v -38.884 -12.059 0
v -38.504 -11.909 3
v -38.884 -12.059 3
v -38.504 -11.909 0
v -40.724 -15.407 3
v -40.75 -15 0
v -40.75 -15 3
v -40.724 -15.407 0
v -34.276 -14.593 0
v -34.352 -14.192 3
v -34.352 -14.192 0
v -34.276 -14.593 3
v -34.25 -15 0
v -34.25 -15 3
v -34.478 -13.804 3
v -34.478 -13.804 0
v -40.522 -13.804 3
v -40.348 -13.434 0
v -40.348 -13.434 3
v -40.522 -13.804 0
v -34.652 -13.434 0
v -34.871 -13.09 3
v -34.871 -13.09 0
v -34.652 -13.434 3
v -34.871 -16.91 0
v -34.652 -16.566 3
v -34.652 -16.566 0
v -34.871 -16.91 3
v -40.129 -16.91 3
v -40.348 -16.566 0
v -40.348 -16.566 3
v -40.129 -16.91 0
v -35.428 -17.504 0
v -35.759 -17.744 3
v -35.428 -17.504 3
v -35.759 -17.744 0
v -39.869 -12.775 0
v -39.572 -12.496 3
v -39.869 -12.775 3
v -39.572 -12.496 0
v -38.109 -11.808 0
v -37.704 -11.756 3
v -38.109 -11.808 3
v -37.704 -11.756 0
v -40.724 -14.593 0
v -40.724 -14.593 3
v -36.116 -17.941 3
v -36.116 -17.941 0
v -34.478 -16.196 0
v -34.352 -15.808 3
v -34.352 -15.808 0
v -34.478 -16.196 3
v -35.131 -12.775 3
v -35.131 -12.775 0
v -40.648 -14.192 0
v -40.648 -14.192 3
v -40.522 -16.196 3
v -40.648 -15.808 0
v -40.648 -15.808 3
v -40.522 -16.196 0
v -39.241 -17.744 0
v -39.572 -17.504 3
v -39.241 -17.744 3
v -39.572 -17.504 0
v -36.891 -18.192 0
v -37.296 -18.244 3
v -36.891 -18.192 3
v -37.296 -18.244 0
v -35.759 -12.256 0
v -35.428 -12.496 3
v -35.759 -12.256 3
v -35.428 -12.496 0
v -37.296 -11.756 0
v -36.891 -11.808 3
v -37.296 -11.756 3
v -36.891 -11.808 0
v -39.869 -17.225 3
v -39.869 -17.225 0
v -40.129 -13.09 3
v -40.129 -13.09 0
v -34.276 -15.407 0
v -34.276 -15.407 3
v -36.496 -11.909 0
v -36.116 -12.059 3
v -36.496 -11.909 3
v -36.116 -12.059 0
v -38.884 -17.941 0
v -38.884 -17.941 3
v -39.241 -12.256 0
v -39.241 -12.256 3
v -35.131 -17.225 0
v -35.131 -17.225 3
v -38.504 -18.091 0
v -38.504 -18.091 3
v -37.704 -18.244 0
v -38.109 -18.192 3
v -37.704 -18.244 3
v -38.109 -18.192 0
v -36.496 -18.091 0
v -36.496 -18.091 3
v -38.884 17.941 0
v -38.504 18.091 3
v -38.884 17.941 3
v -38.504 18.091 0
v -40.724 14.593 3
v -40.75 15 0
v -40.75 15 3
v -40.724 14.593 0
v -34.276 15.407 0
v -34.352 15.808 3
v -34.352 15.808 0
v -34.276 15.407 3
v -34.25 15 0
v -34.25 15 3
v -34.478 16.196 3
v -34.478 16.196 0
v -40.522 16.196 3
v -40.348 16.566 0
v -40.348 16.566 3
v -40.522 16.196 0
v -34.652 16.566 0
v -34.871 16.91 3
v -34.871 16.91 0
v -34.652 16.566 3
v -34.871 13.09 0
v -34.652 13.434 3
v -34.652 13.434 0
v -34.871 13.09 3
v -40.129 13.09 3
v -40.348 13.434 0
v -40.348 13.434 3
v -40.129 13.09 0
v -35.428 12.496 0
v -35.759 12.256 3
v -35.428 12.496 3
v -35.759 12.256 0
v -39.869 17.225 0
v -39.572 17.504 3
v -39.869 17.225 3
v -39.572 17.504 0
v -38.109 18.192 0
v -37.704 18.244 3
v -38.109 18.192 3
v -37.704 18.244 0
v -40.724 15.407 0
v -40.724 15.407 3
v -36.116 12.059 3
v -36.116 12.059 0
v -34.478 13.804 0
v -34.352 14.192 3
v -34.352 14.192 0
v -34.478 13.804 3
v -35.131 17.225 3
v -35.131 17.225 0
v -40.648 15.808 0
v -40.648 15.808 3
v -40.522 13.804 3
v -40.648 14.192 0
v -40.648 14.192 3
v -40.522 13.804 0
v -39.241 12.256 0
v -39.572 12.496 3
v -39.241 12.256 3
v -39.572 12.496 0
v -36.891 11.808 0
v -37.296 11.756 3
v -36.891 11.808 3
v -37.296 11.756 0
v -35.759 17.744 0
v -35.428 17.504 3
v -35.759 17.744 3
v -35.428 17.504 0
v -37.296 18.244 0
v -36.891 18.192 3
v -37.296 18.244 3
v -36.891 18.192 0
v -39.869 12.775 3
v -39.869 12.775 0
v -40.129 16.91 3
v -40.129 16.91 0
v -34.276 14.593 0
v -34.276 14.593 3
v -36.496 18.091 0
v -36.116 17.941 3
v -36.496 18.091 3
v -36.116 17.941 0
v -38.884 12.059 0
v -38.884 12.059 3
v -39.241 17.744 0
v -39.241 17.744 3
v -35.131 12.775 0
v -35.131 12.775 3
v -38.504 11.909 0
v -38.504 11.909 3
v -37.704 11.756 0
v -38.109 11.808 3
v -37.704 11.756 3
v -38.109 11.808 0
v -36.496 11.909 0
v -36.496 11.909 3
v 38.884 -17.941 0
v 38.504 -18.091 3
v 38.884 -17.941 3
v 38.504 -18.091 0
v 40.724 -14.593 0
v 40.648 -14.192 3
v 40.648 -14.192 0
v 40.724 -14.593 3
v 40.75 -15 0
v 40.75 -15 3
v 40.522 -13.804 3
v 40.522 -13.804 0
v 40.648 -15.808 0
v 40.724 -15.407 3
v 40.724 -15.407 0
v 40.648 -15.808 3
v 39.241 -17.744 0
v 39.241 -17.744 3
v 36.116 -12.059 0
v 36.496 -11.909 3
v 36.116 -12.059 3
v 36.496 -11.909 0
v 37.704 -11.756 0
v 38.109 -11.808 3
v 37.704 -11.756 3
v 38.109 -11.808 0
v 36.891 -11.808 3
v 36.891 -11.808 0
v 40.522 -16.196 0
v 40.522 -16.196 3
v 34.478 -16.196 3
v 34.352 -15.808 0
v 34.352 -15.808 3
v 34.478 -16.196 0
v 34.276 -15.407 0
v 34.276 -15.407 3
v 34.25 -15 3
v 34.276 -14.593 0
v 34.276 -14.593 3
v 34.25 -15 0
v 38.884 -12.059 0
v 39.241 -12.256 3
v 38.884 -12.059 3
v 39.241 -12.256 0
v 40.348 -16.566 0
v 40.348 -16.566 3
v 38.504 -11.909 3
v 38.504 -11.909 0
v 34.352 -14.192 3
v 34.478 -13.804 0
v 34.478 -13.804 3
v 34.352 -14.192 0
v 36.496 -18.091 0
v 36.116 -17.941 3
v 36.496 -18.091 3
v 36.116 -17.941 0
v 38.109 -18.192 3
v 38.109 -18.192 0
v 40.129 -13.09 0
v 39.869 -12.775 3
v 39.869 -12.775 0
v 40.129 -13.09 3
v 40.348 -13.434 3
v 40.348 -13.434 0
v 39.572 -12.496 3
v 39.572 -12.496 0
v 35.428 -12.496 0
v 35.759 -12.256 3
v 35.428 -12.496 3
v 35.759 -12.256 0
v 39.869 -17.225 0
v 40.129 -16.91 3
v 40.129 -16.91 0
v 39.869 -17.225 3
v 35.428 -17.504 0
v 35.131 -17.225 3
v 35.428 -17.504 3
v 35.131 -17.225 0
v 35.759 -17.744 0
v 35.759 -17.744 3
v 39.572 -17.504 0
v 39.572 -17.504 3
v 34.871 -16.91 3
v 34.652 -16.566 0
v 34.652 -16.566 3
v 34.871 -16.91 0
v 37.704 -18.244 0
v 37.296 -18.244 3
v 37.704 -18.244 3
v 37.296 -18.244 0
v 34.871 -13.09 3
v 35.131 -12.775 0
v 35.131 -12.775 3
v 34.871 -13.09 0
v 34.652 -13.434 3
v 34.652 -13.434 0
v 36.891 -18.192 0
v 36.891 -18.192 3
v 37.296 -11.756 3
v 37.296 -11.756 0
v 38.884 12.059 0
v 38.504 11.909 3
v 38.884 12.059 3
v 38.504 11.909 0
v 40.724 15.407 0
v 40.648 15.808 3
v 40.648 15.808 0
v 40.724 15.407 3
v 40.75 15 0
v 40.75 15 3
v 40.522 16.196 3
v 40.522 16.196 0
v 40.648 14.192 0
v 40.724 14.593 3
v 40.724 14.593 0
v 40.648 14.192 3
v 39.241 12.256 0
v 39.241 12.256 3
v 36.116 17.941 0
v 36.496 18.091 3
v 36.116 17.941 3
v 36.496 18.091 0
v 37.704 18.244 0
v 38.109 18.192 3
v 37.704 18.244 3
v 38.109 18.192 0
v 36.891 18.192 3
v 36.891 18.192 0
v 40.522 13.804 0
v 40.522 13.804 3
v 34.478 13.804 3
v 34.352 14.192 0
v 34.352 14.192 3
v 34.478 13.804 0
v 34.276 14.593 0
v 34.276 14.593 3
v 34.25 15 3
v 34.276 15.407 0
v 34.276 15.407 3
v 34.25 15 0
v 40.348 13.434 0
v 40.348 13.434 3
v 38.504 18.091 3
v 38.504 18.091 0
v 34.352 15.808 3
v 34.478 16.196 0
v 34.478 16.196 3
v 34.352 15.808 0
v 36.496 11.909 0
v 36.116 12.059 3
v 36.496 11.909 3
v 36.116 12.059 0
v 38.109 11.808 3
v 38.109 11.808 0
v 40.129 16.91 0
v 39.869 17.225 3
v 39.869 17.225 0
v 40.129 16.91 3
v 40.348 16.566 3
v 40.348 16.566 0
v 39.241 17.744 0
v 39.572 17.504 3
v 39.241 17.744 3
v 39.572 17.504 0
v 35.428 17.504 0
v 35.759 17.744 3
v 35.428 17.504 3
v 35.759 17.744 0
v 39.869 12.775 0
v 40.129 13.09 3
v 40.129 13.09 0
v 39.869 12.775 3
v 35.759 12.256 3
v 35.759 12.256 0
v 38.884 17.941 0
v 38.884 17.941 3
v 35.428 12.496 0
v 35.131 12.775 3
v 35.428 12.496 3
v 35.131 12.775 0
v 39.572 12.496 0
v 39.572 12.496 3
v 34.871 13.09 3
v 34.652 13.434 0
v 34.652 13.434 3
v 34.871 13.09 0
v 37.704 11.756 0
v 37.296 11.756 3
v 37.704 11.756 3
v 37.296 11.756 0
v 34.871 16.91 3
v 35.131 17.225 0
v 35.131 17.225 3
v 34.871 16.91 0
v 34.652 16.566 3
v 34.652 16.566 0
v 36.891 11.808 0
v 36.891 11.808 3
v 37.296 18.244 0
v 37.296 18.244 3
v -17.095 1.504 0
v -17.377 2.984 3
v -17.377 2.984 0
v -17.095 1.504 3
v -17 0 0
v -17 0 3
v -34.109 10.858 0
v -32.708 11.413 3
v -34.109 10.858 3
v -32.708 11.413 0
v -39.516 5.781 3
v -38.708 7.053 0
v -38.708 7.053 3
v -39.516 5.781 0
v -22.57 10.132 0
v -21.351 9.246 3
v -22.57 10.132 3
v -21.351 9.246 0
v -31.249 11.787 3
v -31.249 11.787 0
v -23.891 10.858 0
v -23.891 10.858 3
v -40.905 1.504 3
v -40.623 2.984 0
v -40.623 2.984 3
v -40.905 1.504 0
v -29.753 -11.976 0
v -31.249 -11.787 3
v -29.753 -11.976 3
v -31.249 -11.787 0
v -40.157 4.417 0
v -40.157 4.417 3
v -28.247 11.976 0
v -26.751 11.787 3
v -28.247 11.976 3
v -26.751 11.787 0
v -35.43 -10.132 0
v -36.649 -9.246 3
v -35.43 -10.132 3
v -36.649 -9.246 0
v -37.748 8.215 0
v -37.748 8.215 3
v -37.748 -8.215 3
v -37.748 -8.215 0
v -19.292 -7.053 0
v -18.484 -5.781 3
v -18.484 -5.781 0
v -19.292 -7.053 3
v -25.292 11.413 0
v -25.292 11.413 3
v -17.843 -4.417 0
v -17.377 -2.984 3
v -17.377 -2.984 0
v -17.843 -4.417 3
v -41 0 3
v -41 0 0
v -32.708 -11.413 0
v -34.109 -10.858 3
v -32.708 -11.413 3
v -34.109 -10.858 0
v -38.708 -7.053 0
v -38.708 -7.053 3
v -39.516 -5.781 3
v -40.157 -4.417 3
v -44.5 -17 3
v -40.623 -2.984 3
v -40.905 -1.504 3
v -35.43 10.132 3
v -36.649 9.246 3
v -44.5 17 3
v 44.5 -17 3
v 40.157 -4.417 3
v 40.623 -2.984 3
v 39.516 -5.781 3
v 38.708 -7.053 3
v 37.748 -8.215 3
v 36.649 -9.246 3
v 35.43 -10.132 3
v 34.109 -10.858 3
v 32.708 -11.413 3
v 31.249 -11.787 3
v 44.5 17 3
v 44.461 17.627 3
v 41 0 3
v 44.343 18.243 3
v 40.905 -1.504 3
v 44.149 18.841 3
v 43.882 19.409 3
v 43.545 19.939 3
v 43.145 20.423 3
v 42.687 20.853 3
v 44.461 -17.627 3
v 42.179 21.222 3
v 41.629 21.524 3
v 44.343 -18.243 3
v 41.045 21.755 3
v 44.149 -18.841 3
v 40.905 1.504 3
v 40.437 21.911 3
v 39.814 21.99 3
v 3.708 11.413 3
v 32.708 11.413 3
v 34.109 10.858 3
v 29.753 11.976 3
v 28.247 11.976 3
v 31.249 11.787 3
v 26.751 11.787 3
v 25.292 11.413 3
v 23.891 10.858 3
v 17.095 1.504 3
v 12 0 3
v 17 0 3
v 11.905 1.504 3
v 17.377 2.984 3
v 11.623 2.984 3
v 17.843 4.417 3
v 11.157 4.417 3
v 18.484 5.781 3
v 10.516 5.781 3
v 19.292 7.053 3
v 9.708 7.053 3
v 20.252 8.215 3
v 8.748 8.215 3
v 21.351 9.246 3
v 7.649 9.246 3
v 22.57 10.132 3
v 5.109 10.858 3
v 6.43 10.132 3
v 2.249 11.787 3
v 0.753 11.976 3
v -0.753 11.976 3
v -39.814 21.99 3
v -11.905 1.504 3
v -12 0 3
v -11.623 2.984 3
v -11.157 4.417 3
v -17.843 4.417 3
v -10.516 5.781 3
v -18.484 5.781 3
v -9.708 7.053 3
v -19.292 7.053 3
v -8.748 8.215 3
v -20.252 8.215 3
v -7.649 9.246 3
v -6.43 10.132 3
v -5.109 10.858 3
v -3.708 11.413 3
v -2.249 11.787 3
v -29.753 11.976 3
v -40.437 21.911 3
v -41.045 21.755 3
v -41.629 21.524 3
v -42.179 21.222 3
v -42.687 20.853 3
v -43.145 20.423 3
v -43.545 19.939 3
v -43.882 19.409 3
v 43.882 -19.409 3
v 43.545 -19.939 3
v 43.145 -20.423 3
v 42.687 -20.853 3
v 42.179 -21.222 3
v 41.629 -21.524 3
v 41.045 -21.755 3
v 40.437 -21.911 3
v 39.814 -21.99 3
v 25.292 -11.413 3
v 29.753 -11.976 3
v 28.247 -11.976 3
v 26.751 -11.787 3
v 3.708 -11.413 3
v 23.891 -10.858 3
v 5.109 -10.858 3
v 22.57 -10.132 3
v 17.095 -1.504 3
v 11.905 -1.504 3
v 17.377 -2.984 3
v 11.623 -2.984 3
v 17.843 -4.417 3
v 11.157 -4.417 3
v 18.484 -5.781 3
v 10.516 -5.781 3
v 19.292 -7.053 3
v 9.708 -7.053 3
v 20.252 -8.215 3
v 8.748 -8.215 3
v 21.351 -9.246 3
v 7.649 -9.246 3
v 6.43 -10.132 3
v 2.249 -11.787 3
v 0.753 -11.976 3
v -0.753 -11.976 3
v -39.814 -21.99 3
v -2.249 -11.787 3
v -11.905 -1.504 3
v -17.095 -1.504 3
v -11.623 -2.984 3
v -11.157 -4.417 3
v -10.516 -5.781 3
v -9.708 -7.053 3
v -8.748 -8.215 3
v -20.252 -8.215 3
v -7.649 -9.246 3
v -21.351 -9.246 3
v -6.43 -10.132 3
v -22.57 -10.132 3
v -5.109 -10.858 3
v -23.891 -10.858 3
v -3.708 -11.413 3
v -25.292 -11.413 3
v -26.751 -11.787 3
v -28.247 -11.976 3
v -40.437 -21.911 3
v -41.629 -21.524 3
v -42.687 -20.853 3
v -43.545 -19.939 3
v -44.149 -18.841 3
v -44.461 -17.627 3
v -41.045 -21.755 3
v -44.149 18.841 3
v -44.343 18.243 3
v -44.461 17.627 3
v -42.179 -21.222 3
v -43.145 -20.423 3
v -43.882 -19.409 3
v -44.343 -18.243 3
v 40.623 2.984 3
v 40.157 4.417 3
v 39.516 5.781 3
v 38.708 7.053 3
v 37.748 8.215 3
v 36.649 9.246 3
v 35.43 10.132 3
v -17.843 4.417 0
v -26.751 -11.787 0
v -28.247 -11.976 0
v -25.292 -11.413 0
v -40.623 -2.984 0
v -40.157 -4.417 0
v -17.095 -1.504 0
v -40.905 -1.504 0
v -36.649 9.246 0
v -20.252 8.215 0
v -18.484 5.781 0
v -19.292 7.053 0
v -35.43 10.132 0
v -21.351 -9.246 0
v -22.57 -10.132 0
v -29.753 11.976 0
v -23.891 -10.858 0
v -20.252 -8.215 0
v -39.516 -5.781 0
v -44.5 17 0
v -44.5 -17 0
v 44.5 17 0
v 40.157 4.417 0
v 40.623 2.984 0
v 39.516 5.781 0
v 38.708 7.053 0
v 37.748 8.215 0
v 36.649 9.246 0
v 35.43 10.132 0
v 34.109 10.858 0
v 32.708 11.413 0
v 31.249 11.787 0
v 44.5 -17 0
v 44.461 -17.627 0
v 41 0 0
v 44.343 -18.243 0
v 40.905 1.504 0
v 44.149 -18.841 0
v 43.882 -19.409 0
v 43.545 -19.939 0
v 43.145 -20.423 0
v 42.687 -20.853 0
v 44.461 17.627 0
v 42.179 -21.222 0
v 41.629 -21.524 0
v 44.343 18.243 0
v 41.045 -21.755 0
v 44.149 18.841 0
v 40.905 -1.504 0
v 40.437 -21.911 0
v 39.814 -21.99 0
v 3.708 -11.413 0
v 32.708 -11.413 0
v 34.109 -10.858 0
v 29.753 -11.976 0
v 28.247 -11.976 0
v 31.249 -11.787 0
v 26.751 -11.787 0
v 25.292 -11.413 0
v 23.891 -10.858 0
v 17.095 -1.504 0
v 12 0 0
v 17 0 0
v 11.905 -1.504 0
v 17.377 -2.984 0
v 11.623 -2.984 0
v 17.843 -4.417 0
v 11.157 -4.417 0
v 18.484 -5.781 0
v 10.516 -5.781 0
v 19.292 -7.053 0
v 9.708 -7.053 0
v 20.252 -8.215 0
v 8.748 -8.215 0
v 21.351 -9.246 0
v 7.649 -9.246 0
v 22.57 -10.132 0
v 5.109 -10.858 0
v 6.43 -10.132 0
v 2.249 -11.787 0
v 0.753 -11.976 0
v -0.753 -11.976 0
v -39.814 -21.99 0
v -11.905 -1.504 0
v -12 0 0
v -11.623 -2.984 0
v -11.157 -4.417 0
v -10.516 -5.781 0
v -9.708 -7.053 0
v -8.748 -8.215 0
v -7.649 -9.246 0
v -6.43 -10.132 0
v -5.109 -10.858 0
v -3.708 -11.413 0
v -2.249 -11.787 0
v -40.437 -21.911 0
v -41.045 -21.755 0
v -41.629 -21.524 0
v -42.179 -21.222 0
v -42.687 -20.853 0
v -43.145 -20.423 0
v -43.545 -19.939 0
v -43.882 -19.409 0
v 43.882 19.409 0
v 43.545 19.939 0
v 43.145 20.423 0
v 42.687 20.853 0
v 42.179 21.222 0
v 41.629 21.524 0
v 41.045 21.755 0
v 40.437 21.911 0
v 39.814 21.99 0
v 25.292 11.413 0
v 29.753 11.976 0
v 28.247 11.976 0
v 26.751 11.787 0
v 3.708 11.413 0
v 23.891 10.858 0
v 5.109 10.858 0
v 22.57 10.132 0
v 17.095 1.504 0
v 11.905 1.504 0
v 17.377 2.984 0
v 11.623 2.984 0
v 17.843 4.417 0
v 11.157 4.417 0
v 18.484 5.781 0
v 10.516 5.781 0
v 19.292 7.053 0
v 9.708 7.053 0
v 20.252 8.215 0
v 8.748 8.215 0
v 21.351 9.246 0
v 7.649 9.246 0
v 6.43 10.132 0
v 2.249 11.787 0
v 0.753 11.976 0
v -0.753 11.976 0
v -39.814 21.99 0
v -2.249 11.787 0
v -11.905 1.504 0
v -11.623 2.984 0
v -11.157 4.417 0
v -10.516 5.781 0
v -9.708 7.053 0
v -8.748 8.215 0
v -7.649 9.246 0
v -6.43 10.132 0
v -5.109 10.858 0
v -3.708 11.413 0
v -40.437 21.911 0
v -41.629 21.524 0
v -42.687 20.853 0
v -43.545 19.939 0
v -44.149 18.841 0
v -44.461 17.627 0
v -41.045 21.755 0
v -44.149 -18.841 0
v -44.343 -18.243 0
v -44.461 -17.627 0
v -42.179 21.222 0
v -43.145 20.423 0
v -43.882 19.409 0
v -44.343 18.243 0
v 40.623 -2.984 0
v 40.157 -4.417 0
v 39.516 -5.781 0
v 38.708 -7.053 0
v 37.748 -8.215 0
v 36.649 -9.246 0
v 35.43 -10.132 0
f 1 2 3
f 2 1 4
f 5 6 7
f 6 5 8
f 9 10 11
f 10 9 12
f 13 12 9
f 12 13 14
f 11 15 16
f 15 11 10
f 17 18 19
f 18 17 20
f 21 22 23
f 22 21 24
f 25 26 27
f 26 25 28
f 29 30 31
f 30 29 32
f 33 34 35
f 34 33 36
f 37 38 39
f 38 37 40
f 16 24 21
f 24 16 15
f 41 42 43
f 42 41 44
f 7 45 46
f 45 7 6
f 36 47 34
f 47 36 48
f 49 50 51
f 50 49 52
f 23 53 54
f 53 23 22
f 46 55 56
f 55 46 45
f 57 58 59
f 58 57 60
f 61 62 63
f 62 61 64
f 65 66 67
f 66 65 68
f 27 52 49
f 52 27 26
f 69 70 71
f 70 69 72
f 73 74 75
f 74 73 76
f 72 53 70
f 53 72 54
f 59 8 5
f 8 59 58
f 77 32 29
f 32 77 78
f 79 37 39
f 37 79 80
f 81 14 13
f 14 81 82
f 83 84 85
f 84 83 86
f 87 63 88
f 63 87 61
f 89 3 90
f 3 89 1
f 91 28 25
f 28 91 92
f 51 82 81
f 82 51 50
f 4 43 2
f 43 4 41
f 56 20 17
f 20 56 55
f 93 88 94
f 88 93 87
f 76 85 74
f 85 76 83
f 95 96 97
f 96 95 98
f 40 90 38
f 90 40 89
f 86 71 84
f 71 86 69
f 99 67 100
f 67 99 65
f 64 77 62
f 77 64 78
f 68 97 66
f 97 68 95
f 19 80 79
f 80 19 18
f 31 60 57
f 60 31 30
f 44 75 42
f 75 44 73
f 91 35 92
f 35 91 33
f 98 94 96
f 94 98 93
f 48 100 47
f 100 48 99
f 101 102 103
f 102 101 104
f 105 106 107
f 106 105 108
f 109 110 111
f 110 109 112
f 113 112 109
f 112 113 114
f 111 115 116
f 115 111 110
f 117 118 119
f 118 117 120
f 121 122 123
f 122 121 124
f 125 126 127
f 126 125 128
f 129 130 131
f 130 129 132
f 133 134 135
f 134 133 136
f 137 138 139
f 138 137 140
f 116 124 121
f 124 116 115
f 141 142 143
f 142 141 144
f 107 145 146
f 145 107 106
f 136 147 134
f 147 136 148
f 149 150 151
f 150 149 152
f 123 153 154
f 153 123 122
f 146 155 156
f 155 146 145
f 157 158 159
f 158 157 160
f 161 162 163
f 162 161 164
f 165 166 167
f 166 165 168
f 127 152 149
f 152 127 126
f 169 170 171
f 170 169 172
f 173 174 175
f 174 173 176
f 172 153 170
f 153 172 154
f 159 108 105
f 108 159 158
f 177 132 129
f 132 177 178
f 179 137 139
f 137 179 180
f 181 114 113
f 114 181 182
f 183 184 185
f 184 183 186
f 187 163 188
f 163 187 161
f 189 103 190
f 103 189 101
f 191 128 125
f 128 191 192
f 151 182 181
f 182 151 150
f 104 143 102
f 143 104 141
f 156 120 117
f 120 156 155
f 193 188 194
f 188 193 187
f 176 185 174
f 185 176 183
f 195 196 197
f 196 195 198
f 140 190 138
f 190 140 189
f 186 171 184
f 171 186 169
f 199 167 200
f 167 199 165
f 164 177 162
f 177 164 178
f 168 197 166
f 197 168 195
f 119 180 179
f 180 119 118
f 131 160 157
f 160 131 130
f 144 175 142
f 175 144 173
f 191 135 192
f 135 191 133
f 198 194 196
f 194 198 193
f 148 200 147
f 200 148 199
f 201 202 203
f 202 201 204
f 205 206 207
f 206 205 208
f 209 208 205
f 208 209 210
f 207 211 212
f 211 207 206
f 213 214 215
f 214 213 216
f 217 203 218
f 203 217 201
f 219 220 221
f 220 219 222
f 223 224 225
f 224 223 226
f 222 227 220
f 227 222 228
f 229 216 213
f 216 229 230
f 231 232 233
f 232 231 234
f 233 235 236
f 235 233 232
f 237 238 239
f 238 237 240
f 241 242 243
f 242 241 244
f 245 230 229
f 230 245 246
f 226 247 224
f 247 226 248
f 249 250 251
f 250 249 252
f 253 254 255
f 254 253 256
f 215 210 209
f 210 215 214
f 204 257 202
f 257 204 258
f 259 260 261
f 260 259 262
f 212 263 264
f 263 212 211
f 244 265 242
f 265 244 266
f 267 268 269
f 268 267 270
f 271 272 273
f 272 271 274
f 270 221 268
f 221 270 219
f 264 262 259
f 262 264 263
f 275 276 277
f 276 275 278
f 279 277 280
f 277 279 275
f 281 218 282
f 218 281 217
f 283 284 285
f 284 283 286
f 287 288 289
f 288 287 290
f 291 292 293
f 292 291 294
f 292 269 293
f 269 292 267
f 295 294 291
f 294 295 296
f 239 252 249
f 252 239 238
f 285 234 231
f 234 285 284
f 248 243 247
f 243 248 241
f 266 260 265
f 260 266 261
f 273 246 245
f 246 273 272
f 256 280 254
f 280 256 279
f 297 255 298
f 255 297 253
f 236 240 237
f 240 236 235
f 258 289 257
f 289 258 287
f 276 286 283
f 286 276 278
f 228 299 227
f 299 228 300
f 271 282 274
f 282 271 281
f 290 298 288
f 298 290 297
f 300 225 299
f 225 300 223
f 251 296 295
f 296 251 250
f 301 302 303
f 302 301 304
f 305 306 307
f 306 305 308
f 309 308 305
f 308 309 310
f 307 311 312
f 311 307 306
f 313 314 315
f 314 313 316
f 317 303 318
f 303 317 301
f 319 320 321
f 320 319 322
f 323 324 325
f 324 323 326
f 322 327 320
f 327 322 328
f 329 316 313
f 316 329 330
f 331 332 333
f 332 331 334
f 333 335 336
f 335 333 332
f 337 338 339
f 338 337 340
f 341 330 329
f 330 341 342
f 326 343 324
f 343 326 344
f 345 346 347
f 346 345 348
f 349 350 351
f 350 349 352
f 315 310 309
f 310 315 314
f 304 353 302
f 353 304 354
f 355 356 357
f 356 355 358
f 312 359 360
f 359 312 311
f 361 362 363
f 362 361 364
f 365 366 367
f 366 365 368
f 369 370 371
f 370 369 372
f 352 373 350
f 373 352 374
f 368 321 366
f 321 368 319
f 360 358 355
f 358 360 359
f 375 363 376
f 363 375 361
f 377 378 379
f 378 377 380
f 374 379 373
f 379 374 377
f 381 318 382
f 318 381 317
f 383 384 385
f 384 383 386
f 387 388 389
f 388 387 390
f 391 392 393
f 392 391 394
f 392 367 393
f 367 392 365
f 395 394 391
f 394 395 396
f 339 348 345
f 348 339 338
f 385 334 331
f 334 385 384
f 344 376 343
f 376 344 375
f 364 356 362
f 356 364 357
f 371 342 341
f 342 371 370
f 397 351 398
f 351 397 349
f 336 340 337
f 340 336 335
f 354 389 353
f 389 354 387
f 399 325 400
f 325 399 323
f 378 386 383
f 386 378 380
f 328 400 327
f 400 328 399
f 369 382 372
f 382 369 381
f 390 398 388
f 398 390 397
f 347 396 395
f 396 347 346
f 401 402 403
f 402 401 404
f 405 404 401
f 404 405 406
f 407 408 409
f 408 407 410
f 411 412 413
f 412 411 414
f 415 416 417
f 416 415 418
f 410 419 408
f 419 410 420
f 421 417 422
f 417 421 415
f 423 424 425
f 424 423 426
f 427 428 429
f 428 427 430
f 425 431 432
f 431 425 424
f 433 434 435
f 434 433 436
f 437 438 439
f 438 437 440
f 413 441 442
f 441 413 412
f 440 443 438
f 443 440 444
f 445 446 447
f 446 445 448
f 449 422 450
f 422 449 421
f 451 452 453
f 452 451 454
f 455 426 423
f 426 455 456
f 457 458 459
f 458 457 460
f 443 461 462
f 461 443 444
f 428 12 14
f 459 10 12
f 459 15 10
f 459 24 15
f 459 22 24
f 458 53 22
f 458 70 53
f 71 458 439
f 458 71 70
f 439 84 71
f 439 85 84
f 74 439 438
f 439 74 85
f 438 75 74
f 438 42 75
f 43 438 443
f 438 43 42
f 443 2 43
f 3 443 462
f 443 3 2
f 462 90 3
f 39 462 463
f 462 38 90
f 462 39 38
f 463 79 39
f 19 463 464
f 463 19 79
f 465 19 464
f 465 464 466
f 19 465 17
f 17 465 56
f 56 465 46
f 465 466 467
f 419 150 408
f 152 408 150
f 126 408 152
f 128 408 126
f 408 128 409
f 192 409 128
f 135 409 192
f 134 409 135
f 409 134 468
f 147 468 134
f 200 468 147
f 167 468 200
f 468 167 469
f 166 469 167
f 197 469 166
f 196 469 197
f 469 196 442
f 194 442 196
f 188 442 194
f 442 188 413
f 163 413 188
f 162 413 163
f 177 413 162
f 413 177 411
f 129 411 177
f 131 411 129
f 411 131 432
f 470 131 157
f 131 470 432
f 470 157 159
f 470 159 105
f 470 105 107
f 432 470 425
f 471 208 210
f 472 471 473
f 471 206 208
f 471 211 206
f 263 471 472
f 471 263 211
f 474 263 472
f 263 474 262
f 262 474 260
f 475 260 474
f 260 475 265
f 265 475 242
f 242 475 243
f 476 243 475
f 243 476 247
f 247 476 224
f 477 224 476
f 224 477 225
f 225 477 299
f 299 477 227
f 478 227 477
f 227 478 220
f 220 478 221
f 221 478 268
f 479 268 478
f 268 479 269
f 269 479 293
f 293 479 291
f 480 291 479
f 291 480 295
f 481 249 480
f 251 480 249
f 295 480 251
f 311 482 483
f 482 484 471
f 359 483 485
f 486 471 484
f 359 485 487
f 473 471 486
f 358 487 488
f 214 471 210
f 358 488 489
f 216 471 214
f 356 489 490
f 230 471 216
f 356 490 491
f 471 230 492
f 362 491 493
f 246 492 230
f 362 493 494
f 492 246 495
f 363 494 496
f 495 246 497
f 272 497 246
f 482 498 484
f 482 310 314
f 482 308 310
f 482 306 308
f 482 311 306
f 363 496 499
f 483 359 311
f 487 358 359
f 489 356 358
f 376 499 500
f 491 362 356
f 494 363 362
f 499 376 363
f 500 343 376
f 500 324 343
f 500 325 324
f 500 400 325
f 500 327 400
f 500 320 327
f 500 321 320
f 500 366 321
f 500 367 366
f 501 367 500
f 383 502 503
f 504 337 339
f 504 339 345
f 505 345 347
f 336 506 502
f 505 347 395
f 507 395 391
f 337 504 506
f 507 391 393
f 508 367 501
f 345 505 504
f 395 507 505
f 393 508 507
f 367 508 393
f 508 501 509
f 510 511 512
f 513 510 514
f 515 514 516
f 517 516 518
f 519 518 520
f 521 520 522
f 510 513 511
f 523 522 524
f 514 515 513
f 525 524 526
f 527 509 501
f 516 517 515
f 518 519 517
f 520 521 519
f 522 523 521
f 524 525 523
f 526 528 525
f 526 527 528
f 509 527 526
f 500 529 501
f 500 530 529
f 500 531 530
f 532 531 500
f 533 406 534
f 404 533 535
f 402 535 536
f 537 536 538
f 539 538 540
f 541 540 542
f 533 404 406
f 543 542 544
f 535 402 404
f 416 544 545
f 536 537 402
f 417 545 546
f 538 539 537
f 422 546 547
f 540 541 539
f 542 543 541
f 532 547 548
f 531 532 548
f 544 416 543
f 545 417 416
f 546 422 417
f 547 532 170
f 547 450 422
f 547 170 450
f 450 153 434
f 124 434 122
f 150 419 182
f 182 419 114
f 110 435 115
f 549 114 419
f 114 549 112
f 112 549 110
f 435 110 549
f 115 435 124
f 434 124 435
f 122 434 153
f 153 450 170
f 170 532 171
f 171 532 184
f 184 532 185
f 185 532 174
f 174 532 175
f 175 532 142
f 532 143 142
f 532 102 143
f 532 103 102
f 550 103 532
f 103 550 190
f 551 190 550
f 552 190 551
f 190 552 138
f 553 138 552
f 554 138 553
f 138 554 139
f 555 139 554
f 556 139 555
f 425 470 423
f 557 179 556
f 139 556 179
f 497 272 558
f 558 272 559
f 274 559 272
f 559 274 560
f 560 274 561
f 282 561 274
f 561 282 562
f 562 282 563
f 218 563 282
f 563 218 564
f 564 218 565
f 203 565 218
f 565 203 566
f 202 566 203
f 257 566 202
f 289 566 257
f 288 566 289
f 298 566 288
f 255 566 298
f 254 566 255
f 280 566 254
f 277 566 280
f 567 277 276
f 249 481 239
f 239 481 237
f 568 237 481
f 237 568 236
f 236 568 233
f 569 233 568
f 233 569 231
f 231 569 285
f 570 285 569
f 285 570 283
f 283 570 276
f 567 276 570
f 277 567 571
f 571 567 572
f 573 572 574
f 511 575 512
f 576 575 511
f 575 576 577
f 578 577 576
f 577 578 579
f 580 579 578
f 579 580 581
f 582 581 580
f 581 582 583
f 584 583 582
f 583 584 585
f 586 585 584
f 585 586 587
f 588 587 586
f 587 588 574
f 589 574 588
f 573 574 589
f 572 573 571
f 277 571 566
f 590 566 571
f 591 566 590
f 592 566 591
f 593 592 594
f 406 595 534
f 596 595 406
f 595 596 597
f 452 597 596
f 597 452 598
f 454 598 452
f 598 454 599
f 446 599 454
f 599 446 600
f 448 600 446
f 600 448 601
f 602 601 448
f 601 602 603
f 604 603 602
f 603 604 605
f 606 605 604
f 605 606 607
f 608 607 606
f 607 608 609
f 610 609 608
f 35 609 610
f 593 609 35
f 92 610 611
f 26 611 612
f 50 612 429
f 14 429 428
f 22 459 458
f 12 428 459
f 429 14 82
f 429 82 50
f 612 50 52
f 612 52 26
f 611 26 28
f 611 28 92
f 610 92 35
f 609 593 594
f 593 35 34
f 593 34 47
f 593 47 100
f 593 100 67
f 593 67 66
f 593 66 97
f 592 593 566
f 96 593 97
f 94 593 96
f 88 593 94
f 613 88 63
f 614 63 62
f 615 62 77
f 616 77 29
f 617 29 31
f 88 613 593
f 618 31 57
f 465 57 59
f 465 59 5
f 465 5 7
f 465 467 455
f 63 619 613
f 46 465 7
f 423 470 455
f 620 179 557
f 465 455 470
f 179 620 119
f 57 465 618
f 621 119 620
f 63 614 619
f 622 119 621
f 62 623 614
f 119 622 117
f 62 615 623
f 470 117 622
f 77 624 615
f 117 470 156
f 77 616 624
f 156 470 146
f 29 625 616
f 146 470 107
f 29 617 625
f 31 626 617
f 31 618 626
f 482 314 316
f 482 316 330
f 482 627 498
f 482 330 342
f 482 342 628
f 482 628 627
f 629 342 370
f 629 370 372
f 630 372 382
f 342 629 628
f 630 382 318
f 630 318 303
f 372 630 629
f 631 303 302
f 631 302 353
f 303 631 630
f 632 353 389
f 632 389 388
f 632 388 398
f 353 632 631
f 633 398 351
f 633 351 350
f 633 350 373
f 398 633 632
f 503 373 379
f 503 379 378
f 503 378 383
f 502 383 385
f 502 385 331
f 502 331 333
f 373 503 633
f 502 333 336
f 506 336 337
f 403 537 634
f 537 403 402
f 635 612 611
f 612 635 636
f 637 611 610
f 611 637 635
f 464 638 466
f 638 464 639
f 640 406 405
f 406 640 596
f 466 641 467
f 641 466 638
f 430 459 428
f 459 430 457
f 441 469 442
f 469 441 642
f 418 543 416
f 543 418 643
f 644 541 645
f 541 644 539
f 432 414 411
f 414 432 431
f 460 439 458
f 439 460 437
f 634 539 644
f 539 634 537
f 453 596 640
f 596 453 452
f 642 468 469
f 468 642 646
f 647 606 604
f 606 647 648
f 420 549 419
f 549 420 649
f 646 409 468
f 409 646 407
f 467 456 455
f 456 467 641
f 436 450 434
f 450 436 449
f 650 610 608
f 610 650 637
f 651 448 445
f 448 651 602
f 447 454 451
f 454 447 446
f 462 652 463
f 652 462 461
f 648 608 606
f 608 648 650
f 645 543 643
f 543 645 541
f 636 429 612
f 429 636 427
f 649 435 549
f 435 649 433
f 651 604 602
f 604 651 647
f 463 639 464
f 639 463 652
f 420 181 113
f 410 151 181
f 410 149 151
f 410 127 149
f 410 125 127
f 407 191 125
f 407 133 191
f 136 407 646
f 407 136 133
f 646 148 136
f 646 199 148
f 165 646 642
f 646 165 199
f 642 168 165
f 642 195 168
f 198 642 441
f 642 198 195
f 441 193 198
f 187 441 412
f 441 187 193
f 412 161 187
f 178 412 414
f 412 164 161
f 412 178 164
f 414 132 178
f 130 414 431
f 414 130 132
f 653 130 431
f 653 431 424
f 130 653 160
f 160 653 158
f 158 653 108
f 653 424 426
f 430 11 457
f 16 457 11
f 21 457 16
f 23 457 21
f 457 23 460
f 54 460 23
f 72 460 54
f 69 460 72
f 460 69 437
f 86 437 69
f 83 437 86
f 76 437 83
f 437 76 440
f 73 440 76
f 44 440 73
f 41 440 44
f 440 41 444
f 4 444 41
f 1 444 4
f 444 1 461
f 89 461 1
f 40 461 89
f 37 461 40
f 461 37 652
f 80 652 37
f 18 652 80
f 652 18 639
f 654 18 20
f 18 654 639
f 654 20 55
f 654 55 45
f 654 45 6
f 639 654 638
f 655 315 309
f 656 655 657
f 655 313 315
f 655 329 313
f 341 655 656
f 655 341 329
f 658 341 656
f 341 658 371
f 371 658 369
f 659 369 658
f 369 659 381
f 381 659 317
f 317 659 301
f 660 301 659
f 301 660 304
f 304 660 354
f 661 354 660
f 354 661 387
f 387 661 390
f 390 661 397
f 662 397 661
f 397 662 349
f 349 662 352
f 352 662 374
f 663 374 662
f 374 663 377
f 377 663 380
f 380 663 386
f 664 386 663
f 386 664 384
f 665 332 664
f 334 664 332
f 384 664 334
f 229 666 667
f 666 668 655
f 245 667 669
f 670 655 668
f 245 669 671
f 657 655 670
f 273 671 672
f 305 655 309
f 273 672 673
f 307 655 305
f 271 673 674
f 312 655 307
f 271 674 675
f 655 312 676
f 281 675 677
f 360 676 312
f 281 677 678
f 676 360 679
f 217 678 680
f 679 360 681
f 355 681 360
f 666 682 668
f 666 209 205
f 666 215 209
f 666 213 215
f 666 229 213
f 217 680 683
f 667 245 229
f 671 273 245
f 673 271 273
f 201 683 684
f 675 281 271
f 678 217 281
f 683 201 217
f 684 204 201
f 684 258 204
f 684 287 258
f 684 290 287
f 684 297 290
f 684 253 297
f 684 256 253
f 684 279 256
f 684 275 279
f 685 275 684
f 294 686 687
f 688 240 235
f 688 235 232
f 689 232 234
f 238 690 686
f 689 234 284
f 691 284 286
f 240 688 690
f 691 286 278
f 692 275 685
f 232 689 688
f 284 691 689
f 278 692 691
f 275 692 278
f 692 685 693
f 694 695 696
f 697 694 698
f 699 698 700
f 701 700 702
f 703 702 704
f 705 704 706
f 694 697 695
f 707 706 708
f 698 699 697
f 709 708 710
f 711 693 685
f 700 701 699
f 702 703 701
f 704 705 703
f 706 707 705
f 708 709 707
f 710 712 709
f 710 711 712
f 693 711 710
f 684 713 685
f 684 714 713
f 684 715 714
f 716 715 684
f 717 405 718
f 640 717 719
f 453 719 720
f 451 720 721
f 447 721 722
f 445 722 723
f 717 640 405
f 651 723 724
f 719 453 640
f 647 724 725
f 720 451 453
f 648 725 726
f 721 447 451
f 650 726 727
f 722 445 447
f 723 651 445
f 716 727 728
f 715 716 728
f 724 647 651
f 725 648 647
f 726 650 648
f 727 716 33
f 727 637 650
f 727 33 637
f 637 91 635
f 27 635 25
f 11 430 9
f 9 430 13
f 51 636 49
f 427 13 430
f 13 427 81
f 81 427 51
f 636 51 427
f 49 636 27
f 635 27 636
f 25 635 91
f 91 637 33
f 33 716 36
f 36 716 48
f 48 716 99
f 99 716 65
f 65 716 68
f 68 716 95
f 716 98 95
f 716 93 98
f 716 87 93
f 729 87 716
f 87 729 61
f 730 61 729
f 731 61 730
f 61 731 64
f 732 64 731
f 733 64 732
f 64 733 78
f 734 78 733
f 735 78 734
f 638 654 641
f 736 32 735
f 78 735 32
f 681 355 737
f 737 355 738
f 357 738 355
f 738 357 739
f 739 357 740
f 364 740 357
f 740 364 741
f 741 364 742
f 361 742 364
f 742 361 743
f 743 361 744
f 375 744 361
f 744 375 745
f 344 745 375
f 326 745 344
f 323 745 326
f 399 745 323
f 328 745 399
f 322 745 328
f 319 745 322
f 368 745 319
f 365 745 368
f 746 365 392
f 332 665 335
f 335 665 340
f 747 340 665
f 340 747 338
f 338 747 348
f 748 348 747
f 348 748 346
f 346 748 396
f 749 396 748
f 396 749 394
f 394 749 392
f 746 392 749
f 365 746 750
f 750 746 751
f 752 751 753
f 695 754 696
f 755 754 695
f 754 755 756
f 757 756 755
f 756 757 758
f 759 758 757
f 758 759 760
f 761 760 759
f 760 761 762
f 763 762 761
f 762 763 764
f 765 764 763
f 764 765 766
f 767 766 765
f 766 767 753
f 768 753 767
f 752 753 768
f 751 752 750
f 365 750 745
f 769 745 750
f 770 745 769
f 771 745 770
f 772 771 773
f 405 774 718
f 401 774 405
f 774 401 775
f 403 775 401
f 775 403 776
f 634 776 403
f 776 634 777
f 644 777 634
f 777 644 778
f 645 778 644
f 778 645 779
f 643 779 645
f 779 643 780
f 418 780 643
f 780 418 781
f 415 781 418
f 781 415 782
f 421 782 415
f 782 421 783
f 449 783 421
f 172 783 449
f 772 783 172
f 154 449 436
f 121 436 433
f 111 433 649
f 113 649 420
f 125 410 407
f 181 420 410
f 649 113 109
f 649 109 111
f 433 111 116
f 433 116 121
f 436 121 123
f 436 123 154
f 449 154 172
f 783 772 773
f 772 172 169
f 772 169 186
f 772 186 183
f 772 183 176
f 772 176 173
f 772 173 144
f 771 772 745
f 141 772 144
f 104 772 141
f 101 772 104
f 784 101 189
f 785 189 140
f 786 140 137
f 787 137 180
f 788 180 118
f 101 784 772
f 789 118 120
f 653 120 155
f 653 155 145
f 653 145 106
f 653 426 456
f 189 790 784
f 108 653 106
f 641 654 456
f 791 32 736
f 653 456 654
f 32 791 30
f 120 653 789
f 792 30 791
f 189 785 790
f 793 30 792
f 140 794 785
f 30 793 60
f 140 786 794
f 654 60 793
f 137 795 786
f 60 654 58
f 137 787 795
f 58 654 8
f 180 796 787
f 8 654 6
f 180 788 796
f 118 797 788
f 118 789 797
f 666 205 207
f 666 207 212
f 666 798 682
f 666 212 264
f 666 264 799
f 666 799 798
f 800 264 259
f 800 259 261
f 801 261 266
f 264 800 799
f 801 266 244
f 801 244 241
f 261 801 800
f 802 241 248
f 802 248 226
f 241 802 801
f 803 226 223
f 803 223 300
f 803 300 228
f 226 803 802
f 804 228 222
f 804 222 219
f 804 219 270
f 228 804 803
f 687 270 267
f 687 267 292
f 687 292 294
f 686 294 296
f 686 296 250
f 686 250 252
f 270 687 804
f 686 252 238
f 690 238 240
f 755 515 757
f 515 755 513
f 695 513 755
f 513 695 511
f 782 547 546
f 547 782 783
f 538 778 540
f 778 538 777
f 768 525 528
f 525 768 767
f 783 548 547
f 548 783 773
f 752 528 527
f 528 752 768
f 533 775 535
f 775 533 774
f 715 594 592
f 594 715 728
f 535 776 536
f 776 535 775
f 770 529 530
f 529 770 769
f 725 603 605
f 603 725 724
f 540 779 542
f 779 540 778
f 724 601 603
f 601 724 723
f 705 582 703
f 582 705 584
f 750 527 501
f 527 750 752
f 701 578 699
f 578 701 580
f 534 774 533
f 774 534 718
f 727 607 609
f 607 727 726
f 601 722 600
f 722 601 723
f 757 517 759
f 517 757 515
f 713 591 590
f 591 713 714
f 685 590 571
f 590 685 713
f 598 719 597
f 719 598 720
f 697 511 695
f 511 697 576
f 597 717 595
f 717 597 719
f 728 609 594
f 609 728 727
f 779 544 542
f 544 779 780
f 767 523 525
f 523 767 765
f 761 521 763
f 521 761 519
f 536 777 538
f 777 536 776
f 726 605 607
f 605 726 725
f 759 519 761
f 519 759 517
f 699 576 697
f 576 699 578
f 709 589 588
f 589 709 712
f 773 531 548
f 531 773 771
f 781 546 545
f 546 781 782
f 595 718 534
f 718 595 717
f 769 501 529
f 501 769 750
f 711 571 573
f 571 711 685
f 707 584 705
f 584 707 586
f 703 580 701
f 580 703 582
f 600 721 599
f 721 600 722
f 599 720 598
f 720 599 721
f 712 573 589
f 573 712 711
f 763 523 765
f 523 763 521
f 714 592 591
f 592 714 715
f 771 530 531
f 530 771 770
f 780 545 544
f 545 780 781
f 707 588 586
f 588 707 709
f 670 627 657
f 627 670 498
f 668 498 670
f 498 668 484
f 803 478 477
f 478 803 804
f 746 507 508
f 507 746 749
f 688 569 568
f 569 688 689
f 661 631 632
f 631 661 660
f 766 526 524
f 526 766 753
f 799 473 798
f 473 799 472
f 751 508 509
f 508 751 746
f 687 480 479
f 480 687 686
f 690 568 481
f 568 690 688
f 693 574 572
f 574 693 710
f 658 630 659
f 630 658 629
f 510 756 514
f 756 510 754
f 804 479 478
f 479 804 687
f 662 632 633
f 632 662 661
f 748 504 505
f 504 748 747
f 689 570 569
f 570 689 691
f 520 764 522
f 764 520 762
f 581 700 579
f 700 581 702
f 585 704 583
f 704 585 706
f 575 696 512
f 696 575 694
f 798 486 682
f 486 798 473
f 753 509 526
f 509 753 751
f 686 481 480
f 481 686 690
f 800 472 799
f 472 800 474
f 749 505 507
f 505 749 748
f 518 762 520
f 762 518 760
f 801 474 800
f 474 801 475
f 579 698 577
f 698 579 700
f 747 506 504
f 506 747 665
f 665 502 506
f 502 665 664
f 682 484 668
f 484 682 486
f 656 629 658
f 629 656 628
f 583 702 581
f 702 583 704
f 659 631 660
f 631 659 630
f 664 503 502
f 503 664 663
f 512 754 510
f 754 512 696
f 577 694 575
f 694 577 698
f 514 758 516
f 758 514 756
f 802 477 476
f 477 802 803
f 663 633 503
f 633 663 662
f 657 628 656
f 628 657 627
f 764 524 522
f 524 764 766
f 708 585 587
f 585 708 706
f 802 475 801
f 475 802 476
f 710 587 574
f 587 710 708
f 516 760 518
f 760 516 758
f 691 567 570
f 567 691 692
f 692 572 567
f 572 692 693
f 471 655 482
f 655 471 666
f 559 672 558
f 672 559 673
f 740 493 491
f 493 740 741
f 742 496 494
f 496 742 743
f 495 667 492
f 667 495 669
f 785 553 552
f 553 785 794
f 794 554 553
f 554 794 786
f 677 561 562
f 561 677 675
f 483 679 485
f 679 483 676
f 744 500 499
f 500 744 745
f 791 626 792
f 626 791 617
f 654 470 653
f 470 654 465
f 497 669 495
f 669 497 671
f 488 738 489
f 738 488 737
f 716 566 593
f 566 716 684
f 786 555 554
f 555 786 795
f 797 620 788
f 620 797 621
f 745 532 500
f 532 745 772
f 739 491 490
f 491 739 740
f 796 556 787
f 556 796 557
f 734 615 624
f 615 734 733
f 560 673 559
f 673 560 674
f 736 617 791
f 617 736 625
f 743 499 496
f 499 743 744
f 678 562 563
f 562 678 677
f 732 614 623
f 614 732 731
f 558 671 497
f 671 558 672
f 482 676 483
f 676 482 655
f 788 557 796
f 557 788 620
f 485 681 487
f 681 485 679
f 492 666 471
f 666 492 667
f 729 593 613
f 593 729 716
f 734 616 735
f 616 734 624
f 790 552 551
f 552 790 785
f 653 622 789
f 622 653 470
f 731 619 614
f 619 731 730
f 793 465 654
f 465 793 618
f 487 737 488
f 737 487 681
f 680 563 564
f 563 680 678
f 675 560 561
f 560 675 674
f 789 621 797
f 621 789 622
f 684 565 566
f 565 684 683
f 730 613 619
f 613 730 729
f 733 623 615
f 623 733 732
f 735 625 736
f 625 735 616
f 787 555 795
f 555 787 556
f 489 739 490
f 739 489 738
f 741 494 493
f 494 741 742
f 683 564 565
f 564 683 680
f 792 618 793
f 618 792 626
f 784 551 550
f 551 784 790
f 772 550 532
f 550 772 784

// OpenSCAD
$fn = 50;

difference() {
	union() {
		hull() {
			translate(v = [-39.5, 17.0, 0]) {
				cylinder(h = 3, r = 5);
			}
			translate(v = [39.5, 17.0, 0]) {
				cylinder(h = 3, r = 5);
			}
			translate(v = [-39.5, -17.0, 0]) {
				cylinder(h = 3, r = 5);
			}
			translate(v = [39.5, -17.0, 0]) {
				cylinder(h = 3, r = 5);
			}
		}
	}
	union() {
		translate(v = [-37.5, -15.0, -100.0]) {
			cylinder(h = 200, r = 3.25);
		}
		translate(v = [-37.5, 15.0, -100.0]) {
			cylinder(h = 200, r = 3.25);
		}
		translate(v = [37.5, -15.0, -100.0]) {
			cylinder(h = 200, r = 3.25);
		}
		translate(v = [37.5, 15.0, -100.0]) {
			cylinder(h = 200, r = 3.25);
		}
		translate(v = [-37.5, -15.0, -100.0]) {
			cylinder(h = 200, r = 1.8);
		}
		translate(v = [-37.5, 15.0, -100.0]) {
			cylinder(h = 200, r = 1.8);
		}
		translate(v = [37.5, -15.0, -100.0]) {
			cylinder(h = 200, r = 1.8);
		}
		translate(v = [37.5, 15.0, -100.0]) {
			cylinder(h = 200, r = 1.8);
		}
		translate(v = [-29.0, 0, 0.0]) {
			cylinder(h = 3, r = 12.0);
		}
		cylinder(h = 3, r = 12.0);
		translate(v = [29.0, 0, 0.0]) {
			cylinder(h = 3, r = 12.0);
		}
	}
}
